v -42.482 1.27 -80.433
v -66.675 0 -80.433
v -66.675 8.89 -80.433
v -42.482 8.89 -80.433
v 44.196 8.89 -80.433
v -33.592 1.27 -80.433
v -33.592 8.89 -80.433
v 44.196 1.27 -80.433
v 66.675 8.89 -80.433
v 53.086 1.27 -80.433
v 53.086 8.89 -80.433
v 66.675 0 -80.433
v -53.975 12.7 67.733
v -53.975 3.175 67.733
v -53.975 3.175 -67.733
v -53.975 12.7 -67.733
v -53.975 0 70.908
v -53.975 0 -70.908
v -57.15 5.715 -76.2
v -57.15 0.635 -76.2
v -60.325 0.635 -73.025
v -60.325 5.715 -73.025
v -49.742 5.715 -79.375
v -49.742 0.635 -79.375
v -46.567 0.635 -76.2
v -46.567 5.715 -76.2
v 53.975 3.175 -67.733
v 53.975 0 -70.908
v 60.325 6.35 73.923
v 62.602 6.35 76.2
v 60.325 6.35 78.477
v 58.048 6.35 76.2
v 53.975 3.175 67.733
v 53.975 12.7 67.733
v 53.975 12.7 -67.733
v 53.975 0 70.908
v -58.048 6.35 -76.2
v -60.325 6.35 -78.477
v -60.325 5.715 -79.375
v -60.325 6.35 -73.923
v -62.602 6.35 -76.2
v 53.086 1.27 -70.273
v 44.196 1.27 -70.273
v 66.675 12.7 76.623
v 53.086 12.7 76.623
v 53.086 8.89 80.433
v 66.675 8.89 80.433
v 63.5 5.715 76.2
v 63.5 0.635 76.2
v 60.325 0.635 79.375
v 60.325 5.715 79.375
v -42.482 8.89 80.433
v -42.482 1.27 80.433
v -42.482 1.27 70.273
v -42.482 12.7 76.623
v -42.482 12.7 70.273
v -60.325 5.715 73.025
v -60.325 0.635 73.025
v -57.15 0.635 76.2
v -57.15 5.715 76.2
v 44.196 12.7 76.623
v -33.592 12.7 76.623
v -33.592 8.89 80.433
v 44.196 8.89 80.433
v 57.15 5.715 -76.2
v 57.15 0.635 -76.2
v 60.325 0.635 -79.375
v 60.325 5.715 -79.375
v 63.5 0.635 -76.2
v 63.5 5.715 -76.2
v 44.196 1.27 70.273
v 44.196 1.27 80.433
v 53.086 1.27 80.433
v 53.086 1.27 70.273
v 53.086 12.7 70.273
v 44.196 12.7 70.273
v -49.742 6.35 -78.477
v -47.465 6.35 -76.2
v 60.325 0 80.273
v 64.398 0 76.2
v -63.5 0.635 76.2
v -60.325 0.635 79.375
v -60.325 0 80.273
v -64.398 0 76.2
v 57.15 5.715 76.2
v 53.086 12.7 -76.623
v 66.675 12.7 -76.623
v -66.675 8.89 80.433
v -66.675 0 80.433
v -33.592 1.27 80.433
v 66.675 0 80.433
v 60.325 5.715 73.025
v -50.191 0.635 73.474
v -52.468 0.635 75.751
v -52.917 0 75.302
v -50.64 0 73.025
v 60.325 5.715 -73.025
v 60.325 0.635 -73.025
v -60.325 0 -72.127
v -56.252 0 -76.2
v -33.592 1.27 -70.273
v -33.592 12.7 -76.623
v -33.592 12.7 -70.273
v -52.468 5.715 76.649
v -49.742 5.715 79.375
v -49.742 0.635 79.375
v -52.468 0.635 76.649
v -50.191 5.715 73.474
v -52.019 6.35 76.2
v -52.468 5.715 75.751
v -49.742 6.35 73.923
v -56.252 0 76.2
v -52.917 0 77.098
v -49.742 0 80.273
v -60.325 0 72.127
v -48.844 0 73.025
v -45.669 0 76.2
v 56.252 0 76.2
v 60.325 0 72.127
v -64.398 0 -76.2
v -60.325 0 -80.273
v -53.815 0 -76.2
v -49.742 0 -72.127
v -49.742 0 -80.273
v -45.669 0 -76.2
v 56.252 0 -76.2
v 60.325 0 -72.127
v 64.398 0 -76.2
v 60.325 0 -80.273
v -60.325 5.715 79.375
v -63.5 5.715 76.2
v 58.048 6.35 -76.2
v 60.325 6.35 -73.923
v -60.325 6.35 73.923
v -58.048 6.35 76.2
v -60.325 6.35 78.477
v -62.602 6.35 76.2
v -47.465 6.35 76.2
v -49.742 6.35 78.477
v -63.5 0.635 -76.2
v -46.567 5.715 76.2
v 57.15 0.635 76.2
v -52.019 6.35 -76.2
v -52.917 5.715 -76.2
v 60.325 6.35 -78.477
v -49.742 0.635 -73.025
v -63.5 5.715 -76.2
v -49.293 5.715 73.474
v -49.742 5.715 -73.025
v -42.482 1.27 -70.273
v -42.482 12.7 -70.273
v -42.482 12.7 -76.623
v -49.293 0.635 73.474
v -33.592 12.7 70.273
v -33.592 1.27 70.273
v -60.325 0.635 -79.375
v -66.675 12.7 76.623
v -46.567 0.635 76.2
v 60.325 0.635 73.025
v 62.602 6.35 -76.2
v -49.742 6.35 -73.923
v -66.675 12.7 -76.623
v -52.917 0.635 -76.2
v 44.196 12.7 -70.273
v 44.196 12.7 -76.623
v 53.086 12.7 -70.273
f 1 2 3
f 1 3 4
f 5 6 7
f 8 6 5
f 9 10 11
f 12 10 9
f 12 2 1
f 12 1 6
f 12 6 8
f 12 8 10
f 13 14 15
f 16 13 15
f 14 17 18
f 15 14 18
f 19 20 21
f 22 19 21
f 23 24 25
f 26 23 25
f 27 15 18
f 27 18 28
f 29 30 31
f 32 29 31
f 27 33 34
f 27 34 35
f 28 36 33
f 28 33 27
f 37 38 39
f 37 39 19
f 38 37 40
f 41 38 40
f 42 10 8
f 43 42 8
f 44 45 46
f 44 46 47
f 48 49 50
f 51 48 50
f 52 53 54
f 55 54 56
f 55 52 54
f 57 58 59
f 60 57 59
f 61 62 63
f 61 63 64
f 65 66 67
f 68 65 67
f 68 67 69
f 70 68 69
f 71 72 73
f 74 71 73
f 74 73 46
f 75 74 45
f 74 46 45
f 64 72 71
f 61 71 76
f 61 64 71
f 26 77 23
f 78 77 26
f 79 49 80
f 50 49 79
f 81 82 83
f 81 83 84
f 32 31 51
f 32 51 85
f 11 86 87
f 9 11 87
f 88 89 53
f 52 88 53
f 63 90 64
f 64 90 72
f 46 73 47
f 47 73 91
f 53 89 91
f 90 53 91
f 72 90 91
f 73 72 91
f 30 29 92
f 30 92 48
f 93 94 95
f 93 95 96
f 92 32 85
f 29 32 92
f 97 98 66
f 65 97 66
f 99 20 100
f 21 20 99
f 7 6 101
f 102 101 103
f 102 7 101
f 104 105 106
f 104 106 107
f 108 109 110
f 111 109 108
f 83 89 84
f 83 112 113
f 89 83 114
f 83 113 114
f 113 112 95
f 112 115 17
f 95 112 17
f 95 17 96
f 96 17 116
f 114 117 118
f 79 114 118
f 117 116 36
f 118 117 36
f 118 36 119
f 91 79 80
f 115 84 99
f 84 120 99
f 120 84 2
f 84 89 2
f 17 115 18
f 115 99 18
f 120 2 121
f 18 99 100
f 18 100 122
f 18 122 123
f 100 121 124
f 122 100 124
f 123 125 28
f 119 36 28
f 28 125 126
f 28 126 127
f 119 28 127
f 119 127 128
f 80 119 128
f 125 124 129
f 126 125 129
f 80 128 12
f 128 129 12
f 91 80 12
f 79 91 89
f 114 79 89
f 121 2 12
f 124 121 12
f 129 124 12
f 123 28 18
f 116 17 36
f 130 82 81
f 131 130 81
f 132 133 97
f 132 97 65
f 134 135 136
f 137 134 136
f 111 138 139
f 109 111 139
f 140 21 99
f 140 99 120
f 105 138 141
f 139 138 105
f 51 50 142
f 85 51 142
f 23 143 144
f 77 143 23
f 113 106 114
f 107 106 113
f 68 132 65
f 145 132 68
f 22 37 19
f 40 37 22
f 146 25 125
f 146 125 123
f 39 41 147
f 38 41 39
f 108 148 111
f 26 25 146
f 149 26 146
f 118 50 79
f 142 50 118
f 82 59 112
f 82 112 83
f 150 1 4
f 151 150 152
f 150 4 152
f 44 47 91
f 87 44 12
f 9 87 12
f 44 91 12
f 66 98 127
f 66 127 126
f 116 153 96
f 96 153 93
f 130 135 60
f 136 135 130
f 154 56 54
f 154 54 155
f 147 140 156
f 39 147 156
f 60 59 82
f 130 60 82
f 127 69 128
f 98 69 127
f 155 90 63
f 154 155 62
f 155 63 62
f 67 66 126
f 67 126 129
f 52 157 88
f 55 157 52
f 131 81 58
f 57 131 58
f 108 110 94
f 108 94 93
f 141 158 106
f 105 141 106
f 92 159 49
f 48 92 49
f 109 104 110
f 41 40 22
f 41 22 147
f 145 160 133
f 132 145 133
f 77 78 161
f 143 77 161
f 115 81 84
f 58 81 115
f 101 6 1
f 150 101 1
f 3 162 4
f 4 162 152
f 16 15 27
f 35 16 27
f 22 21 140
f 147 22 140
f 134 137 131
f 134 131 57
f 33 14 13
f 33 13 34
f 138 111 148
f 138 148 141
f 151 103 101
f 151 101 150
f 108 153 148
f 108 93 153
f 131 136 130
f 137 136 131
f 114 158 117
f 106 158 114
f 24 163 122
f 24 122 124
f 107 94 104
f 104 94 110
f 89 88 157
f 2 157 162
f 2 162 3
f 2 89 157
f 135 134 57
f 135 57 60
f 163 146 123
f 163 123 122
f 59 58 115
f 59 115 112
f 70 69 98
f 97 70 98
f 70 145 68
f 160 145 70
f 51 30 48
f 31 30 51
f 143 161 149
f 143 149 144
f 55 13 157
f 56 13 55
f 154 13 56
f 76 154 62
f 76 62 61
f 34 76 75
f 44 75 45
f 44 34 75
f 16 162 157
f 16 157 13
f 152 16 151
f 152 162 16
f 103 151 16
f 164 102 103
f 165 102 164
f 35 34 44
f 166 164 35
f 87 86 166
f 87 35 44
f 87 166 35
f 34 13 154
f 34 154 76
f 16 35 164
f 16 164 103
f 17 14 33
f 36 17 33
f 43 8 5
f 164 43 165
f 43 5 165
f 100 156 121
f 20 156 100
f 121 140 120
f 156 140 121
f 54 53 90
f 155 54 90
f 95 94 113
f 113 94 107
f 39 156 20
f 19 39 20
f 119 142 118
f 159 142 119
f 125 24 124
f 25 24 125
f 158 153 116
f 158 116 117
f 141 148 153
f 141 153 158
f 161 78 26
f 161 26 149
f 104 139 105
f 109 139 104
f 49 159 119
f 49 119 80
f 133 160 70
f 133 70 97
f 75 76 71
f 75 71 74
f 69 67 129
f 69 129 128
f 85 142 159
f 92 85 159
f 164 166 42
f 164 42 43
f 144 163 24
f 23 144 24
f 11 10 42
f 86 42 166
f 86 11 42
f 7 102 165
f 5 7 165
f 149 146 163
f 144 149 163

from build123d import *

# Parameters (mm, degrees)
SKETCH2_W           = 133.35
SKETCH2_H           = 160.866666666
SKETCH2_W_2         = 107.95
SKETCH2_H_2         = 135.466666666
BOSS_EXTRUDE1_DEPTH = 12.7
CUT_EXTRUDE1_DEPTH  = 6.35
CHAMFER1_SIZE       = 0.635
CHAMFER3_SIZE       = 3.81
SKETCH5_W           = 8.89
SKETCH5_H           = 11.43
CUT_EXTRUDE2_DEPTH  = 10.16
SKETCH6_W           = 8.89
SKETCH6_H           = 11.43
CUT_EXTRUDE3_DEPTH  = 10.16
CHAMFER4_SIZE       = 3.175


with BuildPart() as part:
    # Sketch2 → Boss-Extrude1 (new body)
    with BuildSketch(Plane(origin=(0, 0, 0), x_dir=(1, 0, 0), z_dir=(0, 1, 0))):
        Rectangle(SKETCH2_W, SKETCH2_H)
        Rectangle(SKETCH2_W_2, SKETCH2_H_2, mode=Mode.SUBTRACT)
    extrude(amount=BOSS_EXTRUDE1_DEPTH)

    # Sketch4 → Cut-Extrude1 (cut)
    with BuildSketch(Plane(origin=(0, 0, 0), x_dir=(1, 0, 0), z_dir=(0, 1, 0))):
        Polygon((-63.5, 76.2), (-60.325, 79.375), (-57.15, 76.2), (-60.325, 73.025), align=None)
        Polygon((-52.916666667, 76.2), (-49.741666667, 79.375), (-46.566666667, 76.2), (-49.741666667, 73.025), align=None)
        Polygon((57.15, 76.2), (60.325, 79.375), (63.5, 76.2), (60.325, 73.025), align=None)
        Polygon((57.15, -76.2), (60.325, -73.025), (63.5, -76.2), (60.325, -79.375), align=None)
        Polygon((-52.916666667, -76.2), (-49.741666667, -73.025), (-46.566666667, -76.2), (-49.741666667, -79.375), align=None)
        Polygon((-63.5, -76.2), (-60.325, -73.025), (-57.15, -76.2), (-60.325, -79.375), align=None)
    extrude(amount=CUT_EXTRUDE1_DEPTH, mode=Mode.SUBTRACT)

    # Chamfer1
    chamfer1_edges = [part.edges().sort_by_distance(p)[0] for p in [
        (-61.9125, 0, 77.7875),
        (-58.7375, 0, 77.7875),
        (-58.7375, 0, 74.6125),
        (-61.9125, 0, 74.6125),
        (-61.9125, 6.35, 77.7875),
        (-58.7375, 6.35, 77.7875),
        (-58.7375, 6.35, 74.6125),
        (-61.9125, 6.35, 74.6125),
        (-51.329166667, 0, 77.7875),
        (-52.916666667, 3.175, 76.2),
        (-48.154166667, 0, 77.7875),
        (-48.154166667, 0, 74.6125),
        (-51.329166667, 0, 74.6125),
        (-49.741666667, 3.175, 73.025),
        (-51.329166667, 6.35, 77.7875),
        (-48.154166667, 6.35, 77.7875),
        (-48.154166667, 6.35, 74.6125),
        (-51.329166667, 6.35, 74.6125),
        (58.7375, 0, 77.7875),
        (61.9125, 0, 77.7875),
        (61.9125, 0, 74.6125),
        (58.7375, 0, 74.6125),
        (58.7375, 6.35, 77.7875),
        (61.9125, 6.35, 77.7875),
        (61.9125, 6.35, 74.6125),
        (58.7375, 6.35, 74.6125),
        (58.7375, 0, -74.6125),
        (61.9125, 0, -74.6125),
        (61.9125, 0, -77.7875),
        (58.7375, 0, -77.7875),
        (58.7375, 6.35, -74.6125),
        (61.9125, 6.35, -74.6125),
        (61.9125, 6.35, -77.7875),
        (58.7375, 6.35, -77.7875),
        (-51.329166667, 0, -74.6125),
        (-48.154166667, 0, -74.6125),
        (-48.154166667, 0, -77.7875),
        (-51.329166667, 0, -77.7875),
        (-51.329166667, 6.35, -74.6125),
        (-48.154166667, 6.35, -74.6125),
        (-48.154166667, 6.35, -77.7875),
        (-51.329166667, 6.35, -77.7875),
        (-61.9125, 0, -74.6125),
        (-58.7375, 0, -74.6125),
        (-58.7375, 0, -77.7875),
        (-61.9125, 0, -77.7875),
        (-61.9125, 6.35, -74.6125),
        (-58.7375, 6.35, -74.6125),
        (-58.7375, 6.35, -77.7875),
        (-61.9125, 6.35, -77.7875),
    ]]
    chamfer(chamfer1_edges, length=CHAMFER1_SIZE)

    # Chamfer3
    chamfer3_edges = [part.edges().sort_by_distance(p)[0] for p in [
        (0, 12.7, -80.433333333),
        (0, 12.7, 80.433333333),
    ]]
    chamfer(chamfer3_edges, length=CHAMFER3_SIZE)

    # Sketch5 → Cut-Extrude2 (cut)
    with BuildSketch(Plane.XY.offset(80.433333333)):
        with Locations((-38.0365, 6.985)):
            Rectangle(SKETCH5_W, SKETCH5_H)
        with Locations((48.641, 6.985)):
            Rectangle(SKETCH5_W, SKETCH5_H)
    extrude(amount=-CUT_EXTRUDE2_DEPTH, mode=Mode.SUBTRACT)

    # Sketch6 → Cut-Extrude3 (cut)
    with BuildSketch(Plane(origin=(0, 0, -80.433333333), x_dir=(-1, 0, 0), z_dir=(0, 0, -1))):
        with Locations((38.0365, 6.985)):
            Rectangle(SKETCH6_W, SKETCH6_H)
        with Locations((-48.641, 6.985)):
            Rectangle(SKETCH6_W, SKETCH6_H)
    extrude(amount=-CUT_EXTRUDE3_DEPTH, mode=Mode.SUBTRACT)

    # Chamfer4
    chamfer4_edges = [part.edges().sort_by_distance(p)[0] for p in [
        (0, 0, -67.733333333),
        (0, 0, 67.733333333),
    ]]
    chamfer(chamfer4_edges, length=CHAMFER4_SIZE)


solid = part.part
